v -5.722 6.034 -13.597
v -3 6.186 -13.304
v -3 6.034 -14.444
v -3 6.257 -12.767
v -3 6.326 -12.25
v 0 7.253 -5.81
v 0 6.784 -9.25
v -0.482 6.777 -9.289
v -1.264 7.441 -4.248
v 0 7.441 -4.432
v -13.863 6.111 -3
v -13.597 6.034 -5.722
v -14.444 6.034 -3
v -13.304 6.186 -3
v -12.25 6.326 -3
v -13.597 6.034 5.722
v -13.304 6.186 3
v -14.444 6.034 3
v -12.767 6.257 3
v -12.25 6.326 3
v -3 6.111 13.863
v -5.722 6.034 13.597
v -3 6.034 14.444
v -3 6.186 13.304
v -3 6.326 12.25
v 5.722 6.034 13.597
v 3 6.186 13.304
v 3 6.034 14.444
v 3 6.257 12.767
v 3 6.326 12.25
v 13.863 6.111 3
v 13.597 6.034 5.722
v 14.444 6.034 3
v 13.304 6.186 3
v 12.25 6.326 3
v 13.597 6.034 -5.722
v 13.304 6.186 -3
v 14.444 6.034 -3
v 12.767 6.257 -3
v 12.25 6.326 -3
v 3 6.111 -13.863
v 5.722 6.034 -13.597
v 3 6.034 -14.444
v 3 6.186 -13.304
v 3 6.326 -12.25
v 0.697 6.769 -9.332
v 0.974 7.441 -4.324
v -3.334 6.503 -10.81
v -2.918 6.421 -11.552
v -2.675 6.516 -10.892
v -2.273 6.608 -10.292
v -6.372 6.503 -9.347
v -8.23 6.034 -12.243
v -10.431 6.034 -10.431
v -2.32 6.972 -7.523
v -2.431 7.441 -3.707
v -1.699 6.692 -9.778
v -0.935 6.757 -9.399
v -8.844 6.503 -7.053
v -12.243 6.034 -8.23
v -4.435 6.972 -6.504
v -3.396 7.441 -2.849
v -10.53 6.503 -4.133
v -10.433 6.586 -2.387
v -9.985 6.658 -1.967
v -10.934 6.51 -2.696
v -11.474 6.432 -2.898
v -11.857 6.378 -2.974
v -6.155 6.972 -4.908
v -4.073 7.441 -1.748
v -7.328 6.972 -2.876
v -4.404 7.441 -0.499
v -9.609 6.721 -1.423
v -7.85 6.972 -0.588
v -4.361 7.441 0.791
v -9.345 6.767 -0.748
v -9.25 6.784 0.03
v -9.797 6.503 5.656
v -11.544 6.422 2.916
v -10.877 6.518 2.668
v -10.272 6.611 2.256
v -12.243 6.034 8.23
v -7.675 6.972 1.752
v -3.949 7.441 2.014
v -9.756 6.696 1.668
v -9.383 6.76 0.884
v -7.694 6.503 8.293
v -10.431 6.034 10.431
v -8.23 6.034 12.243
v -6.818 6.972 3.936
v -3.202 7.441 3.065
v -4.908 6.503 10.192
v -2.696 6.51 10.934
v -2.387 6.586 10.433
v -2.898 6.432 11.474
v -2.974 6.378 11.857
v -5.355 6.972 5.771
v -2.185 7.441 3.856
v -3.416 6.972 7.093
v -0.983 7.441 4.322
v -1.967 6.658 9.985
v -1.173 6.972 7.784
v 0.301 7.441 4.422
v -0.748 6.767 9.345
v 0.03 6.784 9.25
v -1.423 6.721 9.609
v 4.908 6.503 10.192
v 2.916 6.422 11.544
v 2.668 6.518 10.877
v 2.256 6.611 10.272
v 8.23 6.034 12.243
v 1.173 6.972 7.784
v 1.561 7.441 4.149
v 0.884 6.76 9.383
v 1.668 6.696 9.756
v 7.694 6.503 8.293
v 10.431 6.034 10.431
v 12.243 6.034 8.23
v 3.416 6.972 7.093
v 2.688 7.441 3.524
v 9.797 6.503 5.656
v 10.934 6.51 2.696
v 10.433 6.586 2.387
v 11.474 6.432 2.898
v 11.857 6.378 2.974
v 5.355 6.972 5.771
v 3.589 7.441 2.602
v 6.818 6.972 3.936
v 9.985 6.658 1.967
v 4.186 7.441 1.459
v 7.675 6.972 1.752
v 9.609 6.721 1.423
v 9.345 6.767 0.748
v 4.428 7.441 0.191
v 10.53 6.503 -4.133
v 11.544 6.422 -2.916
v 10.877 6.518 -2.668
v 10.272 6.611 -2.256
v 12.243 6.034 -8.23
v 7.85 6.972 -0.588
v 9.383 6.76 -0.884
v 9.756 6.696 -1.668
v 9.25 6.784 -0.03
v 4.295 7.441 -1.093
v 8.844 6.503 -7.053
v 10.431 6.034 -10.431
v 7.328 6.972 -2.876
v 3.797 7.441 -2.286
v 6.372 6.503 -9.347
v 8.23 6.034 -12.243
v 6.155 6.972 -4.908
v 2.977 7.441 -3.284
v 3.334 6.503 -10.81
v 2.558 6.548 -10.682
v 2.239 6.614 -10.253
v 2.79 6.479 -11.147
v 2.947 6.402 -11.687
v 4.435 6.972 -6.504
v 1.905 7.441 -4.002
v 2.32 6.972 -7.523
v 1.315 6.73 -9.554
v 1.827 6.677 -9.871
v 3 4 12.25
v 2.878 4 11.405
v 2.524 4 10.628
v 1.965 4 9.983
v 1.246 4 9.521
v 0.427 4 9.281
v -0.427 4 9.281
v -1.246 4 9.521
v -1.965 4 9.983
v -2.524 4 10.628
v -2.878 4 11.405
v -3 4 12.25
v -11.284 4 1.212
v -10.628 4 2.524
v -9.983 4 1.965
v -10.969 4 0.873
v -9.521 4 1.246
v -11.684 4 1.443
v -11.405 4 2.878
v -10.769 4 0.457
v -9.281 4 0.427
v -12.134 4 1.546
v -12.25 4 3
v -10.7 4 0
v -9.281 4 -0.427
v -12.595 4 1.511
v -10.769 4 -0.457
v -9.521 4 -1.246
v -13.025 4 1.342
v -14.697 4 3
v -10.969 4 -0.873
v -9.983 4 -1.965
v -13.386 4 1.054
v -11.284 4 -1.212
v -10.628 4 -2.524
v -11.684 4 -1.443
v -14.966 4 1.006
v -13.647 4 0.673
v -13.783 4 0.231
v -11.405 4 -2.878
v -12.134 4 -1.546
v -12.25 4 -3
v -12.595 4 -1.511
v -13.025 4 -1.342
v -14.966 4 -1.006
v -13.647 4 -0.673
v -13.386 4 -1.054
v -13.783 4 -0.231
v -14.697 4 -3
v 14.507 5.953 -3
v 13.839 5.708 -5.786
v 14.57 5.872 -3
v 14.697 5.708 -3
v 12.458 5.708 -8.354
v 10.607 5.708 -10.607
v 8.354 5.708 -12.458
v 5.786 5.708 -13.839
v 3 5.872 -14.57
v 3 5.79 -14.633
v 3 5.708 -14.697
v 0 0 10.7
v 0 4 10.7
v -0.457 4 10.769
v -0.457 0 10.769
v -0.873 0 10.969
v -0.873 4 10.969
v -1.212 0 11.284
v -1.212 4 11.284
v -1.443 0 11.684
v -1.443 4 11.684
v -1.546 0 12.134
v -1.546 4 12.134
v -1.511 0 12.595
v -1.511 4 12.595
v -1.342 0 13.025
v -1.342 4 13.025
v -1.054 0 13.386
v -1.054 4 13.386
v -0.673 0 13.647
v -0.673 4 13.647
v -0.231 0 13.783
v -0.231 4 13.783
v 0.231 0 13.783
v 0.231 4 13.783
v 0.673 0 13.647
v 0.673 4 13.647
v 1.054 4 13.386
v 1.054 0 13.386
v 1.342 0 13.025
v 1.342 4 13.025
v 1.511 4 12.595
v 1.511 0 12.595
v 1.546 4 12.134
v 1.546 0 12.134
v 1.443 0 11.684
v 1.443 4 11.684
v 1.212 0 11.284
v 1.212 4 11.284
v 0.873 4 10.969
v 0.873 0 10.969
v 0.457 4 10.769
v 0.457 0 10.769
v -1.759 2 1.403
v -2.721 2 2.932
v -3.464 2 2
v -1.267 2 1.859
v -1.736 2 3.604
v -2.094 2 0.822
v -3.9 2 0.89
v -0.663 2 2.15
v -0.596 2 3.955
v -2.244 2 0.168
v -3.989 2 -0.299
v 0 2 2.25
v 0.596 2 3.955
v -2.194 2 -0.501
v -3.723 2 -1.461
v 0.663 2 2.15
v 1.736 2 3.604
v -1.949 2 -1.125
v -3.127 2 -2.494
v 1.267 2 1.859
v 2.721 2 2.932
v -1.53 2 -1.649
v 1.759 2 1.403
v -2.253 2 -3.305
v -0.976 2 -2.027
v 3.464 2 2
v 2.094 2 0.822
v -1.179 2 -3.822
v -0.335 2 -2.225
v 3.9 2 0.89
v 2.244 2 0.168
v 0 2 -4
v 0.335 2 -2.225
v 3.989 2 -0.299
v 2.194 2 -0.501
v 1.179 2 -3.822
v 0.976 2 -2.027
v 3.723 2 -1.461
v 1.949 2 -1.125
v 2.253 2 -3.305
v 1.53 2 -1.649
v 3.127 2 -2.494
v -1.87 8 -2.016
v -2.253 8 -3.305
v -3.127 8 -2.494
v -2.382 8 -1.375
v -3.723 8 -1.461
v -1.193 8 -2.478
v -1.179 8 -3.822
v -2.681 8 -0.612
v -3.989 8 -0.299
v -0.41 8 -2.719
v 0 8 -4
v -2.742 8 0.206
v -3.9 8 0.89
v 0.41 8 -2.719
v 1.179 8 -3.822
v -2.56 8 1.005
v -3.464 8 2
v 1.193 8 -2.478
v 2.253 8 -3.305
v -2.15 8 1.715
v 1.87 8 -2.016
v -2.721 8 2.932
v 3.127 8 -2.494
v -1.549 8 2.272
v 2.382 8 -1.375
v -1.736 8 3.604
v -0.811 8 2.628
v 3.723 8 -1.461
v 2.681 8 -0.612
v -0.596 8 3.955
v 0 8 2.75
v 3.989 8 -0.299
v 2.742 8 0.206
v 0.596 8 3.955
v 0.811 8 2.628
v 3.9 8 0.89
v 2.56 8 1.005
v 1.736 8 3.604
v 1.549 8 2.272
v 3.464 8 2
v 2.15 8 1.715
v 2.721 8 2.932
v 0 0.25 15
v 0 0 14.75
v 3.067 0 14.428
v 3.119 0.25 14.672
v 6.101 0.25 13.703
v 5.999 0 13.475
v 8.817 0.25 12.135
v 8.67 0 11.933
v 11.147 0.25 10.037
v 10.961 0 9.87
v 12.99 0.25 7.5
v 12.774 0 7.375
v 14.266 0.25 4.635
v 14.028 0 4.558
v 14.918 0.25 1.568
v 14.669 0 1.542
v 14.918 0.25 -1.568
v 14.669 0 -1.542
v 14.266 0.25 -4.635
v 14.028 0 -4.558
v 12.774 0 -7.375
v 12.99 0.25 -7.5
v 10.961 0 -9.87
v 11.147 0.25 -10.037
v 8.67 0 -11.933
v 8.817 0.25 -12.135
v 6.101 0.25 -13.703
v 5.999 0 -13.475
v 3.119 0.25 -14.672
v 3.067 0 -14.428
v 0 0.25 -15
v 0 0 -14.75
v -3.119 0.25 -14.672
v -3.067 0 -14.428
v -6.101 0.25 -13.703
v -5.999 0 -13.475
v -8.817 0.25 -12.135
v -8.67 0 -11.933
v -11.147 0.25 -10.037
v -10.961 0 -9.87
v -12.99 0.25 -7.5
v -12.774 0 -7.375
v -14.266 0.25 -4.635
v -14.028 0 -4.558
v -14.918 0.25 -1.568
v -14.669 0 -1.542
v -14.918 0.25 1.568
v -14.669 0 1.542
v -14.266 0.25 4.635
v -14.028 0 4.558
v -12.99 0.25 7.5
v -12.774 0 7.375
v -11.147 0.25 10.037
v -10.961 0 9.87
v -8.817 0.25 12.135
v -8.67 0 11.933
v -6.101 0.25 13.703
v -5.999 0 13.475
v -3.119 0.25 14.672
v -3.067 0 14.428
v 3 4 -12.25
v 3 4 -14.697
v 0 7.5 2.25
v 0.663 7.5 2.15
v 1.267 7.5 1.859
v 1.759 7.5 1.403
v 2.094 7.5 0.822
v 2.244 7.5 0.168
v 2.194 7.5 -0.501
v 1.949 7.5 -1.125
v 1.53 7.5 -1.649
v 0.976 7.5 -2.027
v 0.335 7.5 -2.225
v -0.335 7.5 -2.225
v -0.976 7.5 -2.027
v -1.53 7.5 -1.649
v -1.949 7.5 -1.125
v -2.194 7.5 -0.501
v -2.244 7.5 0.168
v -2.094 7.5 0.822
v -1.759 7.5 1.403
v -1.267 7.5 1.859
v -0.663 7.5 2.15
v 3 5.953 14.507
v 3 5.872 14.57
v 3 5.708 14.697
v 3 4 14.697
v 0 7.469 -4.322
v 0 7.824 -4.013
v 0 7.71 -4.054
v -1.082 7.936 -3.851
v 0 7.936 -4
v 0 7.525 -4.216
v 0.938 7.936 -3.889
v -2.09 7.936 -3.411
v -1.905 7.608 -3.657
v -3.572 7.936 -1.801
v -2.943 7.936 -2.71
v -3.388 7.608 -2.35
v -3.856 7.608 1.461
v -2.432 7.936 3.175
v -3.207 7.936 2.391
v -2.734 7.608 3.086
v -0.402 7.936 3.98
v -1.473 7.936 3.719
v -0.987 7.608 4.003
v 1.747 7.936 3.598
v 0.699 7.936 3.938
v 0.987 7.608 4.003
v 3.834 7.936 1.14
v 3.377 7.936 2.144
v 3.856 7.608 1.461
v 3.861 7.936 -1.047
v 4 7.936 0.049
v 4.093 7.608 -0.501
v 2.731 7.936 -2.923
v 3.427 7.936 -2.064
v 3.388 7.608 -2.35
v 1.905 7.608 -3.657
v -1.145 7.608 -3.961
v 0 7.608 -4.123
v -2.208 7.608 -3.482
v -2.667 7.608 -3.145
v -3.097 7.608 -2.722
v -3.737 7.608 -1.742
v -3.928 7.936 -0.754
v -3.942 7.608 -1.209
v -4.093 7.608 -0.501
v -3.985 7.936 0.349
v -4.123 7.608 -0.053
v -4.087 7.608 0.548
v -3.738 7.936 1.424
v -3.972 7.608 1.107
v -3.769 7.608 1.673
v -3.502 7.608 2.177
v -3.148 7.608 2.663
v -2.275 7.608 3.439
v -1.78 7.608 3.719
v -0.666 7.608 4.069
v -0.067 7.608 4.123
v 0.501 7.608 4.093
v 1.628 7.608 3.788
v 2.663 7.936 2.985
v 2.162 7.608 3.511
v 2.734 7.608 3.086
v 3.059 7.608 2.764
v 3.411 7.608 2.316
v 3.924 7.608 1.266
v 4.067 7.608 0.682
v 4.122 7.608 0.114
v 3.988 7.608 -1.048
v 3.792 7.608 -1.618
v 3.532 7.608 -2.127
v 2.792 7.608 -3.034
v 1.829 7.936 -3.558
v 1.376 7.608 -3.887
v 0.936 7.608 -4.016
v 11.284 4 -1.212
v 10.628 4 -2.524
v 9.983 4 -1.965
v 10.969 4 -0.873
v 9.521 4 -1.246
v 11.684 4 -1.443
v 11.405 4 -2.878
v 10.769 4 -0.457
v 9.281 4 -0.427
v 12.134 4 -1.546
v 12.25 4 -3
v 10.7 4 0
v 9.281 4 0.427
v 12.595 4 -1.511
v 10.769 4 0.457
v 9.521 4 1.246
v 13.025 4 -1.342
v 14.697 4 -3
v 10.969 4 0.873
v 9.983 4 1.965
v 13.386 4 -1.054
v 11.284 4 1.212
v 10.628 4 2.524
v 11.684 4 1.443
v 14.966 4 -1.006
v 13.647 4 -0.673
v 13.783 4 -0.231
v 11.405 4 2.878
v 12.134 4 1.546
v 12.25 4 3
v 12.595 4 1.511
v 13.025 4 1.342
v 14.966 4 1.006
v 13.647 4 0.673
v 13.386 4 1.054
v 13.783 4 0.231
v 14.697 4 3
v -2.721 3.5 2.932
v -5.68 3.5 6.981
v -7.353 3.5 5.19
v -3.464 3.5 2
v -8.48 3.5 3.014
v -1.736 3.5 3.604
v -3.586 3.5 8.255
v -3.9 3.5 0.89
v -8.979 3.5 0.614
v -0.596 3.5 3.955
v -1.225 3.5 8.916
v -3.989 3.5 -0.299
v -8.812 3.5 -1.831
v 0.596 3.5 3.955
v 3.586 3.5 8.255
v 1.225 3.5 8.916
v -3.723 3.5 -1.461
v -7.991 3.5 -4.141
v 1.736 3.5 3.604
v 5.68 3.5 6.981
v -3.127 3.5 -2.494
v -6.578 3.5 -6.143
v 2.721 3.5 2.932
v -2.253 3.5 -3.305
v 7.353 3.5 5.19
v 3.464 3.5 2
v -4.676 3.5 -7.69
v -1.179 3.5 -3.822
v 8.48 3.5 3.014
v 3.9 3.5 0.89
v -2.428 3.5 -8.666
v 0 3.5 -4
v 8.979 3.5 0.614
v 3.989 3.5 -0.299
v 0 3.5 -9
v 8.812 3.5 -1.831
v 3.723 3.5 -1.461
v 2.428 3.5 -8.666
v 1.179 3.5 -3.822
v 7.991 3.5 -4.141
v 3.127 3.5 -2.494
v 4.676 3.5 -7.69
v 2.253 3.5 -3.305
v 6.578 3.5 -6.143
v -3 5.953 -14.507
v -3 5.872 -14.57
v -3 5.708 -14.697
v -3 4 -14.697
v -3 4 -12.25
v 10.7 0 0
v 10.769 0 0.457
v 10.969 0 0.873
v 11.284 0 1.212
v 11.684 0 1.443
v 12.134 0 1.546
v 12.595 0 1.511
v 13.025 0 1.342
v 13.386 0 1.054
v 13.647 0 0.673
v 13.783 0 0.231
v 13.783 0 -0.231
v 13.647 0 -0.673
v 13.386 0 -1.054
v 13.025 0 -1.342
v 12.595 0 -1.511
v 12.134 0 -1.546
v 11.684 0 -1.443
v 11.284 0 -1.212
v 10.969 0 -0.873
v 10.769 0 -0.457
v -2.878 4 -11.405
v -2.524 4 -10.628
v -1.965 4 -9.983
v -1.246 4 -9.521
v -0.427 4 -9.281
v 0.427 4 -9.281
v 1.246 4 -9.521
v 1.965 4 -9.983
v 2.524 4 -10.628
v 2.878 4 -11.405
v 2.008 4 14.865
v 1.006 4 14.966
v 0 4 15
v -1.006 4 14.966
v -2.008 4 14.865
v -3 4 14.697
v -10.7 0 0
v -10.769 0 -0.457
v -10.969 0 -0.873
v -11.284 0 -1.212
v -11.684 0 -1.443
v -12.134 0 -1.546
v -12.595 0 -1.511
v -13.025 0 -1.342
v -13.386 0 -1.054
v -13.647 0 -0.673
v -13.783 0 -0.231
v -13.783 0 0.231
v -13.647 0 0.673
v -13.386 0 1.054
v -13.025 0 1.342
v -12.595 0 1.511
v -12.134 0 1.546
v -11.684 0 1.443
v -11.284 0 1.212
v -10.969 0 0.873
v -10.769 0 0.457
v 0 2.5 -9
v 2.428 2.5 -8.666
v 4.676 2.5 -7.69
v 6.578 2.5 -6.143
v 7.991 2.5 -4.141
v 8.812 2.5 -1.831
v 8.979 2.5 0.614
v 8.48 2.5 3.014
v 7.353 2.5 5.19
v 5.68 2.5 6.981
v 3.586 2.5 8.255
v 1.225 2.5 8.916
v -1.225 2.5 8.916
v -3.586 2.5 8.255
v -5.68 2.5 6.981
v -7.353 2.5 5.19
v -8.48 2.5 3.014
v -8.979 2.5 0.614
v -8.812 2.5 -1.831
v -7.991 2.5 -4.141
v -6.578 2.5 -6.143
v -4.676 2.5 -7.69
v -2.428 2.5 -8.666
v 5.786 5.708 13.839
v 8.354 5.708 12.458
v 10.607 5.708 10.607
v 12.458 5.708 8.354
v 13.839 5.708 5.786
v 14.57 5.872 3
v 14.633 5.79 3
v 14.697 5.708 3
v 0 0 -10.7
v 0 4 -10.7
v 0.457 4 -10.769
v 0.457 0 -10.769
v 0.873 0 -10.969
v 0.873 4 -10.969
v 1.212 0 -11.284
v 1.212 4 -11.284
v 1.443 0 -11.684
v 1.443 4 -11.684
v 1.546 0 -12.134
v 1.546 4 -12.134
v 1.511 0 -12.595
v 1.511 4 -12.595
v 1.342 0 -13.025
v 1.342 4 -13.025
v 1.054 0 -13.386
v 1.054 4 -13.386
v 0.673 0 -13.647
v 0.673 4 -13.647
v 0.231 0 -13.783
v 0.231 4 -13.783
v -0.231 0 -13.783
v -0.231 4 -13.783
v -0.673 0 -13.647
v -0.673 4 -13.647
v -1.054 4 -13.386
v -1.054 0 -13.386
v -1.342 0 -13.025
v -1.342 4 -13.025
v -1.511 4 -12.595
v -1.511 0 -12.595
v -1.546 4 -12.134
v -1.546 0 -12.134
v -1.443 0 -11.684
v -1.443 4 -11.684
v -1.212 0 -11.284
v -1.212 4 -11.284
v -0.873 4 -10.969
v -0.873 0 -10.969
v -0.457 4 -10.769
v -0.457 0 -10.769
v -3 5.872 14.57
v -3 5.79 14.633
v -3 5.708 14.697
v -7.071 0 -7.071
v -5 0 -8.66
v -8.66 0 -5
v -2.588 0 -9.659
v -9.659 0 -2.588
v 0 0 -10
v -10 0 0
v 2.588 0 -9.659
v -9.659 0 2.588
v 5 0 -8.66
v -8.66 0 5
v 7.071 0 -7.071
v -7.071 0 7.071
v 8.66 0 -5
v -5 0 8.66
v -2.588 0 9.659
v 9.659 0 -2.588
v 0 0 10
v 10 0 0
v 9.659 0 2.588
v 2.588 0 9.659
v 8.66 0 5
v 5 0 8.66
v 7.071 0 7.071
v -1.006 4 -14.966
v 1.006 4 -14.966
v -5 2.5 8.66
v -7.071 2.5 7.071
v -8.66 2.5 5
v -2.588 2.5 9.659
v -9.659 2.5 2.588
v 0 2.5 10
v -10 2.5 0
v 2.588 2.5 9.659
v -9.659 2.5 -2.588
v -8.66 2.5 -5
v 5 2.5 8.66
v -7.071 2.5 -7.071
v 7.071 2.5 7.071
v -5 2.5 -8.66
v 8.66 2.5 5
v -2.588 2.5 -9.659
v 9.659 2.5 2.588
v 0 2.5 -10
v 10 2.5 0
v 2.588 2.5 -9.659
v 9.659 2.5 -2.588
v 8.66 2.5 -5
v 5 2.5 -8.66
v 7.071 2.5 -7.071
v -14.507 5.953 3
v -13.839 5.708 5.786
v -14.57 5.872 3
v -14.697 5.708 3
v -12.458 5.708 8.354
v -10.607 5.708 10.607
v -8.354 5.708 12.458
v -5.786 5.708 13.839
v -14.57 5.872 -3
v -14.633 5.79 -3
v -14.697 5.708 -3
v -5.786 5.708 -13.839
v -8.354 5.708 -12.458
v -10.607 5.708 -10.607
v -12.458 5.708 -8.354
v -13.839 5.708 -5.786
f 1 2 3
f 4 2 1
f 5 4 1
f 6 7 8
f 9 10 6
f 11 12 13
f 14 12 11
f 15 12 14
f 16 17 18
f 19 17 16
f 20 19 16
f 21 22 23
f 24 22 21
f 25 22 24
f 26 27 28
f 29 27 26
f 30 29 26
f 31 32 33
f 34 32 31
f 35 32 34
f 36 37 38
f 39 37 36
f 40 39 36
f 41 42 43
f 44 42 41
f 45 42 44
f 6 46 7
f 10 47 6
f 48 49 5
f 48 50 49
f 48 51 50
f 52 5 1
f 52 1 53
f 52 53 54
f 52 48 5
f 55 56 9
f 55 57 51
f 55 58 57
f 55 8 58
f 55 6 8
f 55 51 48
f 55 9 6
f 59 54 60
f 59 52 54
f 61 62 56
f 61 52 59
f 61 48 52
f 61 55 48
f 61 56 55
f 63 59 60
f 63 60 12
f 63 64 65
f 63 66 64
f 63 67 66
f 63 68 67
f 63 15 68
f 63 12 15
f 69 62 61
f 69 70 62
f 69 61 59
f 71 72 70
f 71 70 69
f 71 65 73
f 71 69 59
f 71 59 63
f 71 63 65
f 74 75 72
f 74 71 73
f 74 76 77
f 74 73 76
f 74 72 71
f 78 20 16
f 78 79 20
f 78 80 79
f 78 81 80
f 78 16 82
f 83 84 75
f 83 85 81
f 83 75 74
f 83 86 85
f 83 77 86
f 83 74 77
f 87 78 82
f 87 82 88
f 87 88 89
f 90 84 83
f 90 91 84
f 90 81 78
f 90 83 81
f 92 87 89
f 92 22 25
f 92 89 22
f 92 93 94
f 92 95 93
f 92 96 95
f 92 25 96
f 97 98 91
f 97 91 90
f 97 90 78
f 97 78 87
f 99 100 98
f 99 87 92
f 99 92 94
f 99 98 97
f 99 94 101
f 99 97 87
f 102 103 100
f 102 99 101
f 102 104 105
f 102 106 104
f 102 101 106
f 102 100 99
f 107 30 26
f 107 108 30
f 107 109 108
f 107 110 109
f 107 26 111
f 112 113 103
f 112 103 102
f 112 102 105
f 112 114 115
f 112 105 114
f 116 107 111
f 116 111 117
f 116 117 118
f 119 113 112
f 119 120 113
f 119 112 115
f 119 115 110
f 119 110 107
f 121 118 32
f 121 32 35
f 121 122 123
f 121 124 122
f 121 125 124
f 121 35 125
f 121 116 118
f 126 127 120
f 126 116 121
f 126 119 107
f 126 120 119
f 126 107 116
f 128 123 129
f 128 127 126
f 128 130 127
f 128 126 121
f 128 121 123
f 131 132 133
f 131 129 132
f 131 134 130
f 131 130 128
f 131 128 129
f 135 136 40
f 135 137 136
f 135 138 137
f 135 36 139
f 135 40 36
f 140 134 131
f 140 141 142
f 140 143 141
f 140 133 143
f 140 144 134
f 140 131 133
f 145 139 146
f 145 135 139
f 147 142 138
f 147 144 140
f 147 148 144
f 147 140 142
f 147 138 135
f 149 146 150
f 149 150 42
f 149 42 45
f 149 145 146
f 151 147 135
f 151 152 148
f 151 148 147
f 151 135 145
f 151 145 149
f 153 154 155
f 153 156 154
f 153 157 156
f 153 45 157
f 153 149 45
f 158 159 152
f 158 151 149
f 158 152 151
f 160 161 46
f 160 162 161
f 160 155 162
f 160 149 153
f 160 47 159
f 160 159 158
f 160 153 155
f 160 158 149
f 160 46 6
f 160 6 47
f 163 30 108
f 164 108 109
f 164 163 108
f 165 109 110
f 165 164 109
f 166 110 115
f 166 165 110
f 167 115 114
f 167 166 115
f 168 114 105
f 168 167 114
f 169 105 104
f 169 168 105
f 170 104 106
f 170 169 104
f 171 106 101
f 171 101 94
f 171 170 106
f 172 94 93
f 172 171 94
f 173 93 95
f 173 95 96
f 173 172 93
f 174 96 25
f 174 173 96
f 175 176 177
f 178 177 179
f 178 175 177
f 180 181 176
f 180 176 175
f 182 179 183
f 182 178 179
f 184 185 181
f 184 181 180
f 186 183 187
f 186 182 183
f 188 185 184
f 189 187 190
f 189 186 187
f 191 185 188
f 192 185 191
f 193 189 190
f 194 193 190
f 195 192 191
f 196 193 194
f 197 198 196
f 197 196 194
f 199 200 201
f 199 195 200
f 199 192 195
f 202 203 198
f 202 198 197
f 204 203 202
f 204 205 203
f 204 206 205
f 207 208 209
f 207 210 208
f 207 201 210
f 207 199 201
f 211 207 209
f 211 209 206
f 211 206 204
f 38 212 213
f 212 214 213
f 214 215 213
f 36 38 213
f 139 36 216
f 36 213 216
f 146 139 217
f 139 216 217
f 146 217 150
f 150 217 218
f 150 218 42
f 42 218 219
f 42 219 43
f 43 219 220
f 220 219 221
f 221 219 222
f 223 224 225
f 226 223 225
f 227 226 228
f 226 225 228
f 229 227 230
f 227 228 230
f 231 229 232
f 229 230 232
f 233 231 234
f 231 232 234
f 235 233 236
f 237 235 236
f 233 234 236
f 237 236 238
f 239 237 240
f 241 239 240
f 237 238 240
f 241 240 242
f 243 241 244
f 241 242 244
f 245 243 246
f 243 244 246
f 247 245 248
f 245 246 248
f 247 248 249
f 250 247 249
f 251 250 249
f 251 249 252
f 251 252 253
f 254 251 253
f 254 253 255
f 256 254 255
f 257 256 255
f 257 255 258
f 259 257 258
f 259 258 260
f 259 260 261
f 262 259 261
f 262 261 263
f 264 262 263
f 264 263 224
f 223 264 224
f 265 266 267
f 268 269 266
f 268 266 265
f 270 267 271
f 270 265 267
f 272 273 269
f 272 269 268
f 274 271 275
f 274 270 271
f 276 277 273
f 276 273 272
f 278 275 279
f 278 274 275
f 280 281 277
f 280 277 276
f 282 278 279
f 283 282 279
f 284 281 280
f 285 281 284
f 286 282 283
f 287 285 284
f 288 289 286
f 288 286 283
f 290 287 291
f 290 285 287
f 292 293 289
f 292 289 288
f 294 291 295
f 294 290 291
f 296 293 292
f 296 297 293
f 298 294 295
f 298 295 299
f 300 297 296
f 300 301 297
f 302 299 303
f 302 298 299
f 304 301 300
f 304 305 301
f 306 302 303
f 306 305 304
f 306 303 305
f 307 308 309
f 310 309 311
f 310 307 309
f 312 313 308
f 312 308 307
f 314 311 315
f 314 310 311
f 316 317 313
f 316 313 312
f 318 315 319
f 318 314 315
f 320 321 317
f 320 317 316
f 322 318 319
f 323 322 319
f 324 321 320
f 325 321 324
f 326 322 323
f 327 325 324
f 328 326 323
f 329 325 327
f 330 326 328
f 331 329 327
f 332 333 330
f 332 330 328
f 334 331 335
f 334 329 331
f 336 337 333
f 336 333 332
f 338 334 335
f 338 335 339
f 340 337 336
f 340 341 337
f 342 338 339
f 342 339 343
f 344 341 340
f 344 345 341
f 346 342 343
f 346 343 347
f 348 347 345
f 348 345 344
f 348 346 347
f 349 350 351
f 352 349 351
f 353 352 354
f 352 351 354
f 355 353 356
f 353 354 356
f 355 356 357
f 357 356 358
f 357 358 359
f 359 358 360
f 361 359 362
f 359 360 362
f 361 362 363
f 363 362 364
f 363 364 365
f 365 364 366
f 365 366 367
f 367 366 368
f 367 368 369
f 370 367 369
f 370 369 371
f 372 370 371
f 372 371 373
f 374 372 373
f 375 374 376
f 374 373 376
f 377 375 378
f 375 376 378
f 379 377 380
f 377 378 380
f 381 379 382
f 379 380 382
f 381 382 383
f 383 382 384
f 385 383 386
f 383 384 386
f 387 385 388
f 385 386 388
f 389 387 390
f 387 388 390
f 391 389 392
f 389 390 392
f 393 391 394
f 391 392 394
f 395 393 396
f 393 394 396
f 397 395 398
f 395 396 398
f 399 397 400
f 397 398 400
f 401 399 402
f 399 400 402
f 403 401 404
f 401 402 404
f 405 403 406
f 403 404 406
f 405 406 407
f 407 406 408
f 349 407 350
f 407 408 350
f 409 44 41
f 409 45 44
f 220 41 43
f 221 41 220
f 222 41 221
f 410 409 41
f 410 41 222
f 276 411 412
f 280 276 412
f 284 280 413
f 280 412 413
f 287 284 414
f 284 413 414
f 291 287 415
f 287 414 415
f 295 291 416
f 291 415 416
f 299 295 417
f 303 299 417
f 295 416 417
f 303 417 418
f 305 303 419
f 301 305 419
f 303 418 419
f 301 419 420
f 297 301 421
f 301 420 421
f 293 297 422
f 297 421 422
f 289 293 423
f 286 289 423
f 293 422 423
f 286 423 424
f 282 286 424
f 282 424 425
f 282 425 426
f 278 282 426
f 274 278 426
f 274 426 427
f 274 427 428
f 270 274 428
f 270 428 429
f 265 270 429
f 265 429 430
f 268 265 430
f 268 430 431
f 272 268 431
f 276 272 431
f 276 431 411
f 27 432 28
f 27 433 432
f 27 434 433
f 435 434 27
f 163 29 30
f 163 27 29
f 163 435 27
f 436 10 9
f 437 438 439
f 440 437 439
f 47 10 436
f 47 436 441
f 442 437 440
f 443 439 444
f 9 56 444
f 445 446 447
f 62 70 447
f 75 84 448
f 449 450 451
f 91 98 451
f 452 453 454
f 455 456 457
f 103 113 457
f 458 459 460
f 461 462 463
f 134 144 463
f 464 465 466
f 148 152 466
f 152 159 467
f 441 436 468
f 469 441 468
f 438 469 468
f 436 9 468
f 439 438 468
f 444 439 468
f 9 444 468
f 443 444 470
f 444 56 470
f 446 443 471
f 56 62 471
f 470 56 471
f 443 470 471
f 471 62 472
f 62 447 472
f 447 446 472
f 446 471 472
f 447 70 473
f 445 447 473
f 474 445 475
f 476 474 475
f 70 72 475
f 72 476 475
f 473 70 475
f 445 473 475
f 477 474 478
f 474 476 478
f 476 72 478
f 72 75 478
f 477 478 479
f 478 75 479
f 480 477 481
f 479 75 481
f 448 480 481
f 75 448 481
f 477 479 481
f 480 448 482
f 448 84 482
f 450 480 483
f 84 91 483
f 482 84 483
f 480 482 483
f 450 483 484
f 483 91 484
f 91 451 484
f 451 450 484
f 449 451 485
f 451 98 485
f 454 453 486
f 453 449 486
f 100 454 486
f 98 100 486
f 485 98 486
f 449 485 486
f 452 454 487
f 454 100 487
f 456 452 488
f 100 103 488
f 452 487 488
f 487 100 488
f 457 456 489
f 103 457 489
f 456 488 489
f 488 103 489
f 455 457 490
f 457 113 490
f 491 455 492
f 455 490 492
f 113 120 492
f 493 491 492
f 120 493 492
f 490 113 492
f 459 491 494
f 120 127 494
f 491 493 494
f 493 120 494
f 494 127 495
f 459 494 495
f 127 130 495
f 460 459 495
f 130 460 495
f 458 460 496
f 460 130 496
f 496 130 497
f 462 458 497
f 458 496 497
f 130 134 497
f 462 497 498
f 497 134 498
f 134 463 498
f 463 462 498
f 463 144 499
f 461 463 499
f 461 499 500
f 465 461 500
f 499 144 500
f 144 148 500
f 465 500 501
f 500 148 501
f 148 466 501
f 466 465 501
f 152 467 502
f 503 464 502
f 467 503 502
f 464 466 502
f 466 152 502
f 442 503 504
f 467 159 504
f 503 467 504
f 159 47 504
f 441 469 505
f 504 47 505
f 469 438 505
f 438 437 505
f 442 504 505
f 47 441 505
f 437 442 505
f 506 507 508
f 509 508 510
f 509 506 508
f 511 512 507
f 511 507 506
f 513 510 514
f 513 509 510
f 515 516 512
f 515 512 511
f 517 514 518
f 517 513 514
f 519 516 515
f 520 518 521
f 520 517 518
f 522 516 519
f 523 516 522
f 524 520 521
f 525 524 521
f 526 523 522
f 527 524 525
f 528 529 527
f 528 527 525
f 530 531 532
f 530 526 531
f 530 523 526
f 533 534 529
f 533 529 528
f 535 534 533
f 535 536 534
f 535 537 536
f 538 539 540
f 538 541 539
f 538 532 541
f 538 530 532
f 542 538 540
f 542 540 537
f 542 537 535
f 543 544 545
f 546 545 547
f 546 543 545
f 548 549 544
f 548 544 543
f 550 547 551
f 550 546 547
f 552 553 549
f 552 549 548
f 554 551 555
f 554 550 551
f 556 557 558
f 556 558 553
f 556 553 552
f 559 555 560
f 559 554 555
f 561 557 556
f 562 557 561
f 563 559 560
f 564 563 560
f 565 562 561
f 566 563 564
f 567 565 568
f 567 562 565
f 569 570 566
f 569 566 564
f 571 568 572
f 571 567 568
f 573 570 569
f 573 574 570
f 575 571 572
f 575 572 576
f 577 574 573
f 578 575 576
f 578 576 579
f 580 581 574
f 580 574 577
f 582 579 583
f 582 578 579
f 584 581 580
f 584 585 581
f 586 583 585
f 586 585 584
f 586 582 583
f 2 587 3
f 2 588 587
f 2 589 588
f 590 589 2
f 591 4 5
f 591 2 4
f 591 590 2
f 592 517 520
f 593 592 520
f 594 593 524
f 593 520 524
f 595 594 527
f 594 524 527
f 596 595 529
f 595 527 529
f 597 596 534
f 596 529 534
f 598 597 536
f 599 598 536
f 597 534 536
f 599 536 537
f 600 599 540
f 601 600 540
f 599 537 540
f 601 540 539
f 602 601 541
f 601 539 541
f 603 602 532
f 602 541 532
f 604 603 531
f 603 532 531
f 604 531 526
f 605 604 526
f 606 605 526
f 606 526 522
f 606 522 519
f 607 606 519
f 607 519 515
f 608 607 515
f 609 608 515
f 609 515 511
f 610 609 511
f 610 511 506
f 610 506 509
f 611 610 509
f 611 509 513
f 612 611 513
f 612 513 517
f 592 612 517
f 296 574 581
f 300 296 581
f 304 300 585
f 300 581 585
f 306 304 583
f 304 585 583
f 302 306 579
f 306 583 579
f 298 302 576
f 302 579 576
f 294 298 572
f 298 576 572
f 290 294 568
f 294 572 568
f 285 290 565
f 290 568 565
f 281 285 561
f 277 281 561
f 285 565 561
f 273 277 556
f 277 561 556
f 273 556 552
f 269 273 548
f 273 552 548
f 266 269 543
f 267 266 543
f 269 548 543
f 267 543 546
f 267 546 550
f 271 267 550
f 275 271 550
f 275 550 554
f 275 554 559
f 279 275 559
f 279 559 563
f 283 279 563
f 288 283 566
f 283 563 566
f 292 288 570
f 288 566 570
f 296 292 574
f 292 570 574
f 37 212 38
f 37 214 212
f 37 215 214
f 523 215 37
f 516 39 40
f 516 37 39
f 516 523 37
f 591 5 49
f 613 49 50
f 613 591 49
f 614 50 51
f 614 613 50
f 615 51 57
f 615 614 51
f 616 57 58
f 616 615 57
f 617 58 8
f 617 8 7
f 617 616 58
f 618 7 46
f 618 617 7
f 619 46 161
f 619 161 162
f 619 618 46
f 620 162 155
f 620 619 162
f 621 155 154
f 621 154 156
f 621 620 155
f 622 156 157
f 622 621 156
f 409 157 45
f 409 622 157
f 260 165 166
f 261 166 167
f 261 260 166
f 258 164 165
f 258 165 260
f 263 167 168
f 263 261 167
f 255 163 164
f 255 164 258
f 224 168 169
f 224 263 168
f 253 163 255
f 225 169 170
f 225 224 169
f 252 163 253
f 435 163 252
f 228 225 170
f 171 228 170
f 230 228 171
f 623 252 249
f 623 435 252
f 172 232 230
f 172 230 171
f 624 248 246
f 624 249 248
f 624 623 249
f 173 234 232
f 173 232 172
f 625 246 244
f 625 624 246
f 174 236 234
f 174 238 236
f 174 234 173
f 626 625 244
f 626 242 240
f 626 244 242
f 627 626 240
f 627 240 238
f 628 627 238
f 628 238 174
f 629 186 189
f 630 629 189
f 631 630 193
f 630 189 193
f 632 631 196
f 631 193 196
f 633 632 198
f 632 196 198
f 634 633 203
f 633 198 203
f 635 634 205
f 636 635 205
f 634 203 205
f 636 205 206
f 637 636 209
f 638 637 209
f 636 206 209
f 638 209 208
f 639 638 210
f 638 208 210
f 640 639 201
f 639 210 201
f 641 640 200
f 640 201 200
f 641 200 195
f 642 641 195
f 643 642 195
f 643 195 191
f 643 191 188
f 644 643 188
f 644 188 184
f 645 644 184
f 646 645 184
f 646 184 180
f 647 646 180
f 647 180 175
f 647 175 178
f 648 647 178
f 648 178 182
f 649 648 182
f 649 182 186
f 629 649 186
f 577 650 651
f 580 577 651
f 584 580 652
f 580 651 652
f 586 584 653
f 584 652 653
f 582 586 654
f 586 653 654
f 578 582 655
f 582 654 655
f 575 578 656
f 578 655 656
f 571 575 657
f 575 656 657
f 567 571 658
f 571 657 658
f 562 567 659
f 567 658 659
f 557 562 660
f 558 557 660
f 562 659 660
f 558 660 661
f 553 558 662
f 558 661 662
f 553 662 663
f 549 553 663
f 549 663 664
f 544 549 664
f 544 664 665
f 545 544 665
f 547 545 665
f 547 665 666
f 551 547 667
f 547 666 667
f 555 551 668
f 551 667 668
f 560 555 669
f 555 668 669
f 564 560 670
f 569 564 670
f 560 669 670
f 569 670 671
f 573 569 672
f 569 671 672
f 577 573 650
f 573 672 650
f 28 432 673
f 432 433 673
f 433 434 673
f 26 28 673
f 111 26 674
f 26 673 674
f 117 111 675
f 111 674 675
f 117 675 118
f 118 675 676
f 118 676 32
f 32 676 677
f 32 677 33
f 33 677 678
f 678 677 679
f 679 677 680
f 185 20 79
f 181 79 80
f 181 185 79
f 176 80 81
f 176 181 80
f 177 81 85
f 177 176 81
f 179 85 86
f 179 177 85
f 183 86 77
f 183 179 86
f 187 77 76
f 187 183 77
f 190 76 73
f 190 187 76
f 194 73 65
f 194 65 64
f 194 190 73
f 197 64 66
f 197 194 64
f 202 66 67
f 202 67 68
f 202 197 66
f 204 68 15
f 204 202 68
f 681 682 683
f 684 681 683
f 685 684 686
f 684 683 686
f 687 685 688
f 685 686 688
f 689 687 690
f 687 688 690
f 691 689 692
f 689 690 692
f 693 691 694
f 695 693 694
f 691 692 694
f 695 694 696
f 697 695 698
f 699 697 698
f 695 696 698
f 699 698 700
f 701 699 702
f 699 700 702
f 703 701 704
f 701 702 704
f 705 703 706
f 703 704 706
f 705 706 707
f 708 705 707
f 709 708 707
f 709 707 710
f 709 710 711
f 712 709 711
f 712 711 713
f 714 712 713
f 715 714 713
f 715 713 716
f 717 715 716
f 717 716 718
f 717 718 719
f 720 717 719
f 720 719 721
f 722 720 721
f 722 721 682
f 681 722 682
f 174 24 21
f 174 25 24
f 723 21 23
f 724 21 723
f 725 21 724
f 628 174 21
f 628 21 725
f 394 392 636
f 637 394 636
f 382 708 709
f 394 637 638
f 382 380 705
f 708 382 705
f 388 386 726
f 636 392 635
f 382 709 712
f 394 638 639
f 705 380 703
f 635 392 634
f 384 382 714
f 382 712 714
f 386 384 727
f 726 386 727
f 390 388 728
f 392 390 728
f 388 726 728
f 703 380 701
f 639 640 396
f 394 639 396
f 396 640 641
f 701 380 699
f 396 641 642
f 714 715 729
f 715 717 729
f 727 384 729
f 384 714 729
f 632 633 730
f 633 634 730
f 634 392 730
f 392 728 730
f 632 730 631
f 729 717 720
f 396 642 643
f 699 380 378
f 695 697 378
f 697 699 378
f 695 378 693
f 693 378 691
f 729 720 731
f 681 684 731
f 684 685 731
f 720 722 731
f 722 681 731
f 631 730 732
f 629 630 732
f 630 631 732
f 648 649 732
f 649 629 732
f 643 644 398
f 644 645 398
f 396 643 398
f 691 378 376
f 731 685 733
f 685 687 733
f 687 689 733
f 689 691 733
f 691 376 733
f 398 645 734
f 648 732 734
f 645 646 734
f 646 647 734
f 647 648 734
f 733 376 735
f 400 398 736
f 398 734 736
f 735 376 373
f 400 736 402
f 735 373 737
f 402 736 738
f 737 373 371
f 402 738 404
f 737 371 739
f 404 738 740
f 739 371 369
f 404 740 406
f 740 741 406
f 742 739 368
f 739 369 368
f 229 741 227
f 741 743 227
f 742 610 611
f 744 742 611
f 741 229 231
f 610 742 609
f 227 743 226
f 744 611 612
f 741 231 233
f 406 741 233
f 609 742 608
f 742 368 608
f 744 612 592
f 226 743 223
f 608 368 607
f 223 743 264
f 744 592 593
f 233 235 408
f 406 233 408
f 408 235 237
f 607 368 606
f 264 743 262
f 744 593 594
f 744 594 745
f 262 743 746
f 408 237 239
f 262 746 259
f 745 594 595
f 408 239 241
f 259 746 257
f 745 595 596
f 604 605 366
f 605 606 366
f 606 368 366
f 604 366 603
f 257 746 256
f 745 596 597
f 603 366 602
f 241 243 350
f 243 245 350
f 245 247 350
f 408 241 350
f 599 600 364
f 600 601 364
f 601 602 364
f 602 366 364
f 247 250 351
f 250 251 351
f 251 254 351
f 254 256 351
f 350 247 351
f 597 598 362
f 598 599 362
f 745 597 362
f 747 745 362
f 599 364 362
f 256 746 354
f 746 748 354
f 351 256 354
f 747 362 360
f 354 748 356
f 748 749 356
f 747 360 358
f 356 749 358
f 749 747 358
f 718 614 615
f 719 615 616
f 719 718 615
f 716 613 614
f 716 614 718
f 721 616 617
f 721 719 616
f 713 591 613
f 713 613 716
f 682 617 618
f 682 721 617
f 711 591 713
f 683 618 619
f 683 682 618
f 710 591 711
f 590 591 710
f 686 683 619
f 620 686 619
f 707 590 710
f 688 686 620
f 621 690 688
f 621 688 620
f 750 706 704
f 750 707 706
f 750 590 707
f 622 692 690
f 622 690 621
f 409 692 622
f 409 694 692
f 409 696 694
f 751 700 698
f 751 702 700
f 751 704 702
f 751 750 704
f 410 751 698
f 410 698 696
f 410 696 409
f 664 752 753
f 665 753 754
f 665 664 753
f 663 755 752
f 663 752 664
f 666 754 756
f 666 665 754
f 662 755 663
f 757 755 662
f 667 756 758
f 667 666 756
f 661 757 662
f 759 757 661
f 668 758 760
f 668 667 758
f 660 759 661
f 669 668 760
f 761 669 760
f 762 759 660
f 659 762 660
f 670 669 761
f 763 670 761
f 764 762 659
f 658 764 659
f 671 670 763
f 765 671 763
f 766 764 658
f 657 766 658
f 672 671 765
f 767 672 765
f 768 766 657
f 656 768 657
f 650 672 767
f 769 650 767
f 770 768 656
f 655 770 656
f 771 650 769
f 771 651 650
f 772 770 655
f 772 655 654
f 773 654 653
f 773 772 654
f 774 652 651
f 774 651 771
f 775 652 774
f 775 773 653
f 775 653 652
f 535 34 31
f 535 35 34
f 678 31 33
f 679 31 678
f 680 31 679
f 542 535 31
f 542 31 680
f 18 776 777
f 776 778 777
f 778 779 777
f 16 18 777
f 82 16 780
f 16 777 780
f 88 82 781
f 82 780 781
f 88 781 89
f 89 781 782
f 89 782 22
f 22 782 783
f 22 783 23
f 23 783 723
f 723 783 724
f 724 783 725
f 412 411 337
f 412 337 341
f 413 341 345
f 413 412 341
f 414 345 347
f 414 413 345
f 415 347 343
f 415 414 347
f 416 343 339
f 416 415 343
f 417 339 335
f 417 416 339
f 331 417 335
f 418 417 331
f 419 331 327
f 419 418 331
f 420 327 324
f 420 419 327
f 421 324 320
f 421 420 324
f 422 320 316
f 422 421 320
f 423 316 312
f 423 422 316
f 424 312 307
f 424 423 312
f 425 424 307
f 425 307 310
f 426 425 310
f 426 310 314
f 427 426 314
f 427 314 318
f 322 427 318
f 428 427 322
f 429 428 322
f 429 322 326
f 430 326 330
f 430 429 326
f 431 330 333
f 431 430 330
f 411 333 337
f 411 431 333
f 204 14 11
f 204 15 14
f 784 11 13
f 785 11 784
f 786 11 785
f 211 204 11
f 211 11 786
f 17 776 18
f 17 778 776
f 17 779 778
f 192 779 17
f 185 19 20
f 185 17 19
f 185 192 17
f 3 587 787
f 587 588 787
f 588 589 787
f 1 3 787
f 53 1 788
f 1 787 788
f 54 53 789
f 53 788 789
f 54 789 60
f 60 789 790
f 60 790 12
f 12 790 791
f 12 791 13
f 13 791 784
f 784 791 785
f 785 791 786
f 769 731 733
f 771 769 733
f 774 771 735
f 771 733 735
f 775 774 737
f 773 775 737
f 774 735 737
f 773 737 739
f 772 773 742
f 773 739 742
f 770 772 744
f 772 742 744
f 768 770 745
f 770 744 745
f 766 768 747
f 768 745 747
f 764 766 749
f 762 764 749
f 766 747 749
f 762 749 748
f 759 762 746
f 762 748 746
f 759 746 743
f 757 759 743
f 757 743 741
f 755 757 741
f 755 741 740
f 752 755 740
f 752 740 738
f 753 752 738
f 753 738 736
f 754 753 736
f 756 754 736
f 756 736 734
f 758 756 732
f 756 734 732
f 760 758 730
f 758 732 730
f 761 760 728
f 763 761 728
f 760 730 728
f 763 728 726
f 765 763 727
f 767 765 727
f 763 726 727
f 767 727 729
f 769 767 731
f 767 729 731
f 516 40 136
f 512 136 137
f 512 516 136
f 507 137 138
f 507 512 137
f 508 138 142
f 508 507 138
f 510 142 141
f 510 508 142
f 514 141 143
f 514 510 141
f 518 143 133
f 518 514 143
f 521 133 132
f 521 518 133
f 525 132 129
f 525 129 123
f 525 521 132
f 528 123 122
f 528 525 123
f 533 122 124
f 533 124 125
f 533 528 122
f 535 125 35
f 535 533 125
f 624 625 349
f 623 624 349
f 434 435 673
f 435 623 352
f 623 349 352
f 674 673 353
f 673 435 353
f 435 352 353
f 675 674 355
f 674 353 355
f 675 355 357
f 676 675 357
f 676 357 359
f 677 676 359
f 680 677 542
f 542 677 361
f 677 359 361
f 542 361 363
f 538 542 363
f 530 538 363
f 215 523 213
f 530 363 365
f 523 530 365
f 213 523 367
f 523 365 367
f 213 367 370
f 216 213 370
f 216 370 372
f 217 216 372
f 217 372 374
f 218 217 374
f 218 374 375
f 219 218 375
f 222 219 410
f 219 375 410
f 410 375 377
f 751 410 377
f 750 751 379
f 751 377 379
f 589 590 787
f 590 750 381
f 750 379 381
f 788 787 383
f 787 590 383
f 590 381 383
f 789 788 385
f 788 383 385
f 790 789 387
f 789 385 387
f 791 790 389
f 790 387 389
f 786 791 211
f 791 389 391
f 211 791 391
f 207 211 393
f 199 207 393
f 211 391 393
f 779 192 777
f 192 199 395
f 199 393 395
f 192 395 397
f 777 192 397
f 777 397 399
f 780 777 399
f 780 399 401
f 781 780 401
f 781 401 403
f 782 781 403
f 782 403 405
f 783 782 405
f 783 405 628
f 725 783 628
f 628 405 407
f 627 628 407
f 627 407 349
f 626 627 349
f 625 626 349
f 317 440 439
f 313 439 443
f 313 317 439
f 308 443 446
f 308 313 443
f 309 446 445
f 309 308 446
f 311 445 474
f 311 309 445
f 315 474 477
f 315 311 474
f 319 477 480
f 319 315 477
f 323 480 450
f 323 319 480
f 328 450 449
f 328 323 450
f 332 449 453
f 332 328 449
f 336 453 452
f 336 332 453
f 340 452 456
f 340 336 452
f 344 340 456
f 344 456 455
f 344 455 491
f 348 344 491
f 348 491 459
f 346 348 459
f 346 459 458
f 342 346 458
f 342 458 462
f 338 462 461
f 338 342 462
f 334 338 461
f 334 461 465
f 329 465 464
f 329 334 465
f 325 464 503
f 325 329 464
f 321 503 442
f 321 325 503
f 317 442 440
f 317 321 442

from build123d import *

# Parameters (mm, degrees)
SKETCH_1_R               = 15
EXTRUDE_314_DEPTH        = 8
SKETCH_3_R               = 10
CUT_EXTRUDE_1_DEPTH      = 2.5
SKETCH_5_R               = 9
CUT_EXTRUDE_3_DEPTH      = 1
SKETCH_6_R               = 4
EXTRUDE_2_DEPTH          = 1.5
SKETCH_7_R               = 2.25
CUT_EXTRUDE_4_DEPTH      = 23.671568098
CHAMFER_3_SIZE           = 0.5
CHAMFER_4_SIZE           = 0.25
CHAMFER_4_SIZE2          = 0.292152675
CHAMFER_5_SIZE           = 0.25
FILLET_1_R               = 0.5
CUT_EXTRUDE_START        = 4
CUT_EXTRUDE_6_DEPTH      = 19.671568265
SKETCH_9_R               = 1.55
CUT_EXTRUDE_7_DEPTH      = 22.587033302
PATTERN_CIRCULAR_1_COUNT = 4


with BuildPart() as part:
    # Эскиз1 → Extrude 314 (new body)
    with BuildSketch(Plane(origin=(0, 0, 0), x_dir=(1, 0, 0), z_dir=(0, 1, 0))):
        Circle(SKETCH_1_R)
    extrude(amount=EXTRUDE_314_DEPTH)

    # Эскиз2 → Вырез-Повернуть1 (revolve, cut)
    with BuildSketch(Plane.XY):
        Polygon((4, 8), (15, 8), (15, 6), (4, 7.5), align=None)
    revolve(axis=Axis((0, -1.597938144, 0), (0, 1, 0)), mode=Mode.SUBTRACT)

    # Эскиз3 → Вырез-Вытянуть1 (cut)
    with BuildSketch(Plane(origin=(0, 0, 0), x_dir=(-1, 0, 0), z_dir=(0, -1, 0))):
        Circle(SKETCH_3_R)
    extrude(amount=-CUT_EXTRUDE_1_DEPTH, mode=Mode.SUBTRACT)

    # Эскиз5 → Вырез-Вытянуть3 (cut)
    with BuildSketch(Plane.XZ.offset(-2.5)):
        Circle(SKETCH_5_R)
    extrude(amount=-CUT_EXTRUDE_3_DEPTH, mode=Mode.SUBTRACT)

    # Эскиз6 → Бобышка-Вытянуть2 (add)
    with BuildSketch(Plane.XZ.offset(-3.5)):
        Circle(SKETCH_6_R)
    extrude(amount=EXTRUDE_2_DEPTH)

    # Эскиз7 → Вырез-Вытянуть4 (cut, through all)
    with BuildSketch(Plane(origin=(0, 8, 0), x_dir=(1, 0, 0), z_dir=(0, 1, 0))):
        Circle(SKETCH_7_R)
    extrude(amount=-CUT_EXTRUDE_4_DEPTH, mode=Mode.SUBTRACT)

    # Фаска3
    chamfer_3_edges = [part.edges().sort_by_distance(p)[0] for p in [
        (-2.25, 8, 0),
    ]]
    chamfer(chamfer_3_edges, length=CHAMFER_3_SIZE)

    # Фаска4
    chamfer_4_edges = [part.edges().sort_by_distance(p)[0] for p in [
        (-15, 6, 0),
    ]]
    chamfer_4_side = [part.faces().sort_by_distance(p)[0] for p in [
        (-9.5, 6.75, 0),
    ]]
    chamfer(chamfer_4_edges, length=CHAMFER_4_SIZE, length2=CHAMFER_4_SIZE2, reference=chamfer_4_side[0])

    # Фаска5
    chamfer_5_edges = [part.edges().sort_by_distance(p)[0] for p in [
        (-15, 0, 0),
    ]]
    chamfer(chamfer_5_edges, length=CHAMFER_5_SIZE)

    # Скругление1
    fillet_1_edges = [part.edges().sort_by_distance(p)[0] for p in [
        (-4, 7.5, 0),
    ]]
    fillet(fillet_1_edges, radius=FILLET_1_R)

    # Эскиз8 → Вырез-Вытянуть6 (cut, through all)
    with BuildSketch(Plane(origin=(0, 0, 0), x_dir=(1, 0, 0), z_dir=(0, 1, 0)).offset(CUT_EXTRUDE_START)):
        with BuildLine():
            Line((3, 12.25), (3, 14.696938457))
            ThreePointArc((3, 14.696938457), (0, 15), (-3, 14.696938457))
            Line((-3, 14.696938457), (-3, 12.25))
            ThreePointArc((-3, 12.25), (0, 9.25), (3, 12.25))
        make_face()
    cut_extrude_6 = extrude(amount=CUT_EXTRUDE_6_DEPTH, mode=Mode.SUBTRACT)

    # Эскиз9 → Вырез-Вытянуть7 (cut, through all)
    with BuildSketch(Plane(origin=(0, 4, 0), x_dir=(1, 0, 0), z_dir=(0, 1, 0))):
        with Locations((0, 12.25)):
            Circle(SKETCH_9_R)
    cut_extrude_7 = extrude(amount=-CUT_EXTRUDE_7_DEPTH, mode=Mode.SUBTRACT)

    # Круговой массив1: Вырез-Вытянуть6, Вырез-Вытянуть7 ×4 about axis
    pattern_circular_1_axis = Axis((0, 5.707847325, 0), (0, -1, 0))
    add([cut_extrude_6.rotate(pattern_circular_1_axis, i * 360 / PATTERN_CIRCULAR_1_COUNT) for i in range(1, PATTERN_CIRCULAR_1_COUNT)], mode=Mode.SUBTRACT)
    add([cut_extrude_7.rotate(pattern_circular_1_axis, i * 360 / PATTERN_CIRCULAR_1_COUNT) for i in range(1, PATTERN_CIRCULAR_1_COUNT)], mode=Mode.SUBTRACT)


solid = part.part
